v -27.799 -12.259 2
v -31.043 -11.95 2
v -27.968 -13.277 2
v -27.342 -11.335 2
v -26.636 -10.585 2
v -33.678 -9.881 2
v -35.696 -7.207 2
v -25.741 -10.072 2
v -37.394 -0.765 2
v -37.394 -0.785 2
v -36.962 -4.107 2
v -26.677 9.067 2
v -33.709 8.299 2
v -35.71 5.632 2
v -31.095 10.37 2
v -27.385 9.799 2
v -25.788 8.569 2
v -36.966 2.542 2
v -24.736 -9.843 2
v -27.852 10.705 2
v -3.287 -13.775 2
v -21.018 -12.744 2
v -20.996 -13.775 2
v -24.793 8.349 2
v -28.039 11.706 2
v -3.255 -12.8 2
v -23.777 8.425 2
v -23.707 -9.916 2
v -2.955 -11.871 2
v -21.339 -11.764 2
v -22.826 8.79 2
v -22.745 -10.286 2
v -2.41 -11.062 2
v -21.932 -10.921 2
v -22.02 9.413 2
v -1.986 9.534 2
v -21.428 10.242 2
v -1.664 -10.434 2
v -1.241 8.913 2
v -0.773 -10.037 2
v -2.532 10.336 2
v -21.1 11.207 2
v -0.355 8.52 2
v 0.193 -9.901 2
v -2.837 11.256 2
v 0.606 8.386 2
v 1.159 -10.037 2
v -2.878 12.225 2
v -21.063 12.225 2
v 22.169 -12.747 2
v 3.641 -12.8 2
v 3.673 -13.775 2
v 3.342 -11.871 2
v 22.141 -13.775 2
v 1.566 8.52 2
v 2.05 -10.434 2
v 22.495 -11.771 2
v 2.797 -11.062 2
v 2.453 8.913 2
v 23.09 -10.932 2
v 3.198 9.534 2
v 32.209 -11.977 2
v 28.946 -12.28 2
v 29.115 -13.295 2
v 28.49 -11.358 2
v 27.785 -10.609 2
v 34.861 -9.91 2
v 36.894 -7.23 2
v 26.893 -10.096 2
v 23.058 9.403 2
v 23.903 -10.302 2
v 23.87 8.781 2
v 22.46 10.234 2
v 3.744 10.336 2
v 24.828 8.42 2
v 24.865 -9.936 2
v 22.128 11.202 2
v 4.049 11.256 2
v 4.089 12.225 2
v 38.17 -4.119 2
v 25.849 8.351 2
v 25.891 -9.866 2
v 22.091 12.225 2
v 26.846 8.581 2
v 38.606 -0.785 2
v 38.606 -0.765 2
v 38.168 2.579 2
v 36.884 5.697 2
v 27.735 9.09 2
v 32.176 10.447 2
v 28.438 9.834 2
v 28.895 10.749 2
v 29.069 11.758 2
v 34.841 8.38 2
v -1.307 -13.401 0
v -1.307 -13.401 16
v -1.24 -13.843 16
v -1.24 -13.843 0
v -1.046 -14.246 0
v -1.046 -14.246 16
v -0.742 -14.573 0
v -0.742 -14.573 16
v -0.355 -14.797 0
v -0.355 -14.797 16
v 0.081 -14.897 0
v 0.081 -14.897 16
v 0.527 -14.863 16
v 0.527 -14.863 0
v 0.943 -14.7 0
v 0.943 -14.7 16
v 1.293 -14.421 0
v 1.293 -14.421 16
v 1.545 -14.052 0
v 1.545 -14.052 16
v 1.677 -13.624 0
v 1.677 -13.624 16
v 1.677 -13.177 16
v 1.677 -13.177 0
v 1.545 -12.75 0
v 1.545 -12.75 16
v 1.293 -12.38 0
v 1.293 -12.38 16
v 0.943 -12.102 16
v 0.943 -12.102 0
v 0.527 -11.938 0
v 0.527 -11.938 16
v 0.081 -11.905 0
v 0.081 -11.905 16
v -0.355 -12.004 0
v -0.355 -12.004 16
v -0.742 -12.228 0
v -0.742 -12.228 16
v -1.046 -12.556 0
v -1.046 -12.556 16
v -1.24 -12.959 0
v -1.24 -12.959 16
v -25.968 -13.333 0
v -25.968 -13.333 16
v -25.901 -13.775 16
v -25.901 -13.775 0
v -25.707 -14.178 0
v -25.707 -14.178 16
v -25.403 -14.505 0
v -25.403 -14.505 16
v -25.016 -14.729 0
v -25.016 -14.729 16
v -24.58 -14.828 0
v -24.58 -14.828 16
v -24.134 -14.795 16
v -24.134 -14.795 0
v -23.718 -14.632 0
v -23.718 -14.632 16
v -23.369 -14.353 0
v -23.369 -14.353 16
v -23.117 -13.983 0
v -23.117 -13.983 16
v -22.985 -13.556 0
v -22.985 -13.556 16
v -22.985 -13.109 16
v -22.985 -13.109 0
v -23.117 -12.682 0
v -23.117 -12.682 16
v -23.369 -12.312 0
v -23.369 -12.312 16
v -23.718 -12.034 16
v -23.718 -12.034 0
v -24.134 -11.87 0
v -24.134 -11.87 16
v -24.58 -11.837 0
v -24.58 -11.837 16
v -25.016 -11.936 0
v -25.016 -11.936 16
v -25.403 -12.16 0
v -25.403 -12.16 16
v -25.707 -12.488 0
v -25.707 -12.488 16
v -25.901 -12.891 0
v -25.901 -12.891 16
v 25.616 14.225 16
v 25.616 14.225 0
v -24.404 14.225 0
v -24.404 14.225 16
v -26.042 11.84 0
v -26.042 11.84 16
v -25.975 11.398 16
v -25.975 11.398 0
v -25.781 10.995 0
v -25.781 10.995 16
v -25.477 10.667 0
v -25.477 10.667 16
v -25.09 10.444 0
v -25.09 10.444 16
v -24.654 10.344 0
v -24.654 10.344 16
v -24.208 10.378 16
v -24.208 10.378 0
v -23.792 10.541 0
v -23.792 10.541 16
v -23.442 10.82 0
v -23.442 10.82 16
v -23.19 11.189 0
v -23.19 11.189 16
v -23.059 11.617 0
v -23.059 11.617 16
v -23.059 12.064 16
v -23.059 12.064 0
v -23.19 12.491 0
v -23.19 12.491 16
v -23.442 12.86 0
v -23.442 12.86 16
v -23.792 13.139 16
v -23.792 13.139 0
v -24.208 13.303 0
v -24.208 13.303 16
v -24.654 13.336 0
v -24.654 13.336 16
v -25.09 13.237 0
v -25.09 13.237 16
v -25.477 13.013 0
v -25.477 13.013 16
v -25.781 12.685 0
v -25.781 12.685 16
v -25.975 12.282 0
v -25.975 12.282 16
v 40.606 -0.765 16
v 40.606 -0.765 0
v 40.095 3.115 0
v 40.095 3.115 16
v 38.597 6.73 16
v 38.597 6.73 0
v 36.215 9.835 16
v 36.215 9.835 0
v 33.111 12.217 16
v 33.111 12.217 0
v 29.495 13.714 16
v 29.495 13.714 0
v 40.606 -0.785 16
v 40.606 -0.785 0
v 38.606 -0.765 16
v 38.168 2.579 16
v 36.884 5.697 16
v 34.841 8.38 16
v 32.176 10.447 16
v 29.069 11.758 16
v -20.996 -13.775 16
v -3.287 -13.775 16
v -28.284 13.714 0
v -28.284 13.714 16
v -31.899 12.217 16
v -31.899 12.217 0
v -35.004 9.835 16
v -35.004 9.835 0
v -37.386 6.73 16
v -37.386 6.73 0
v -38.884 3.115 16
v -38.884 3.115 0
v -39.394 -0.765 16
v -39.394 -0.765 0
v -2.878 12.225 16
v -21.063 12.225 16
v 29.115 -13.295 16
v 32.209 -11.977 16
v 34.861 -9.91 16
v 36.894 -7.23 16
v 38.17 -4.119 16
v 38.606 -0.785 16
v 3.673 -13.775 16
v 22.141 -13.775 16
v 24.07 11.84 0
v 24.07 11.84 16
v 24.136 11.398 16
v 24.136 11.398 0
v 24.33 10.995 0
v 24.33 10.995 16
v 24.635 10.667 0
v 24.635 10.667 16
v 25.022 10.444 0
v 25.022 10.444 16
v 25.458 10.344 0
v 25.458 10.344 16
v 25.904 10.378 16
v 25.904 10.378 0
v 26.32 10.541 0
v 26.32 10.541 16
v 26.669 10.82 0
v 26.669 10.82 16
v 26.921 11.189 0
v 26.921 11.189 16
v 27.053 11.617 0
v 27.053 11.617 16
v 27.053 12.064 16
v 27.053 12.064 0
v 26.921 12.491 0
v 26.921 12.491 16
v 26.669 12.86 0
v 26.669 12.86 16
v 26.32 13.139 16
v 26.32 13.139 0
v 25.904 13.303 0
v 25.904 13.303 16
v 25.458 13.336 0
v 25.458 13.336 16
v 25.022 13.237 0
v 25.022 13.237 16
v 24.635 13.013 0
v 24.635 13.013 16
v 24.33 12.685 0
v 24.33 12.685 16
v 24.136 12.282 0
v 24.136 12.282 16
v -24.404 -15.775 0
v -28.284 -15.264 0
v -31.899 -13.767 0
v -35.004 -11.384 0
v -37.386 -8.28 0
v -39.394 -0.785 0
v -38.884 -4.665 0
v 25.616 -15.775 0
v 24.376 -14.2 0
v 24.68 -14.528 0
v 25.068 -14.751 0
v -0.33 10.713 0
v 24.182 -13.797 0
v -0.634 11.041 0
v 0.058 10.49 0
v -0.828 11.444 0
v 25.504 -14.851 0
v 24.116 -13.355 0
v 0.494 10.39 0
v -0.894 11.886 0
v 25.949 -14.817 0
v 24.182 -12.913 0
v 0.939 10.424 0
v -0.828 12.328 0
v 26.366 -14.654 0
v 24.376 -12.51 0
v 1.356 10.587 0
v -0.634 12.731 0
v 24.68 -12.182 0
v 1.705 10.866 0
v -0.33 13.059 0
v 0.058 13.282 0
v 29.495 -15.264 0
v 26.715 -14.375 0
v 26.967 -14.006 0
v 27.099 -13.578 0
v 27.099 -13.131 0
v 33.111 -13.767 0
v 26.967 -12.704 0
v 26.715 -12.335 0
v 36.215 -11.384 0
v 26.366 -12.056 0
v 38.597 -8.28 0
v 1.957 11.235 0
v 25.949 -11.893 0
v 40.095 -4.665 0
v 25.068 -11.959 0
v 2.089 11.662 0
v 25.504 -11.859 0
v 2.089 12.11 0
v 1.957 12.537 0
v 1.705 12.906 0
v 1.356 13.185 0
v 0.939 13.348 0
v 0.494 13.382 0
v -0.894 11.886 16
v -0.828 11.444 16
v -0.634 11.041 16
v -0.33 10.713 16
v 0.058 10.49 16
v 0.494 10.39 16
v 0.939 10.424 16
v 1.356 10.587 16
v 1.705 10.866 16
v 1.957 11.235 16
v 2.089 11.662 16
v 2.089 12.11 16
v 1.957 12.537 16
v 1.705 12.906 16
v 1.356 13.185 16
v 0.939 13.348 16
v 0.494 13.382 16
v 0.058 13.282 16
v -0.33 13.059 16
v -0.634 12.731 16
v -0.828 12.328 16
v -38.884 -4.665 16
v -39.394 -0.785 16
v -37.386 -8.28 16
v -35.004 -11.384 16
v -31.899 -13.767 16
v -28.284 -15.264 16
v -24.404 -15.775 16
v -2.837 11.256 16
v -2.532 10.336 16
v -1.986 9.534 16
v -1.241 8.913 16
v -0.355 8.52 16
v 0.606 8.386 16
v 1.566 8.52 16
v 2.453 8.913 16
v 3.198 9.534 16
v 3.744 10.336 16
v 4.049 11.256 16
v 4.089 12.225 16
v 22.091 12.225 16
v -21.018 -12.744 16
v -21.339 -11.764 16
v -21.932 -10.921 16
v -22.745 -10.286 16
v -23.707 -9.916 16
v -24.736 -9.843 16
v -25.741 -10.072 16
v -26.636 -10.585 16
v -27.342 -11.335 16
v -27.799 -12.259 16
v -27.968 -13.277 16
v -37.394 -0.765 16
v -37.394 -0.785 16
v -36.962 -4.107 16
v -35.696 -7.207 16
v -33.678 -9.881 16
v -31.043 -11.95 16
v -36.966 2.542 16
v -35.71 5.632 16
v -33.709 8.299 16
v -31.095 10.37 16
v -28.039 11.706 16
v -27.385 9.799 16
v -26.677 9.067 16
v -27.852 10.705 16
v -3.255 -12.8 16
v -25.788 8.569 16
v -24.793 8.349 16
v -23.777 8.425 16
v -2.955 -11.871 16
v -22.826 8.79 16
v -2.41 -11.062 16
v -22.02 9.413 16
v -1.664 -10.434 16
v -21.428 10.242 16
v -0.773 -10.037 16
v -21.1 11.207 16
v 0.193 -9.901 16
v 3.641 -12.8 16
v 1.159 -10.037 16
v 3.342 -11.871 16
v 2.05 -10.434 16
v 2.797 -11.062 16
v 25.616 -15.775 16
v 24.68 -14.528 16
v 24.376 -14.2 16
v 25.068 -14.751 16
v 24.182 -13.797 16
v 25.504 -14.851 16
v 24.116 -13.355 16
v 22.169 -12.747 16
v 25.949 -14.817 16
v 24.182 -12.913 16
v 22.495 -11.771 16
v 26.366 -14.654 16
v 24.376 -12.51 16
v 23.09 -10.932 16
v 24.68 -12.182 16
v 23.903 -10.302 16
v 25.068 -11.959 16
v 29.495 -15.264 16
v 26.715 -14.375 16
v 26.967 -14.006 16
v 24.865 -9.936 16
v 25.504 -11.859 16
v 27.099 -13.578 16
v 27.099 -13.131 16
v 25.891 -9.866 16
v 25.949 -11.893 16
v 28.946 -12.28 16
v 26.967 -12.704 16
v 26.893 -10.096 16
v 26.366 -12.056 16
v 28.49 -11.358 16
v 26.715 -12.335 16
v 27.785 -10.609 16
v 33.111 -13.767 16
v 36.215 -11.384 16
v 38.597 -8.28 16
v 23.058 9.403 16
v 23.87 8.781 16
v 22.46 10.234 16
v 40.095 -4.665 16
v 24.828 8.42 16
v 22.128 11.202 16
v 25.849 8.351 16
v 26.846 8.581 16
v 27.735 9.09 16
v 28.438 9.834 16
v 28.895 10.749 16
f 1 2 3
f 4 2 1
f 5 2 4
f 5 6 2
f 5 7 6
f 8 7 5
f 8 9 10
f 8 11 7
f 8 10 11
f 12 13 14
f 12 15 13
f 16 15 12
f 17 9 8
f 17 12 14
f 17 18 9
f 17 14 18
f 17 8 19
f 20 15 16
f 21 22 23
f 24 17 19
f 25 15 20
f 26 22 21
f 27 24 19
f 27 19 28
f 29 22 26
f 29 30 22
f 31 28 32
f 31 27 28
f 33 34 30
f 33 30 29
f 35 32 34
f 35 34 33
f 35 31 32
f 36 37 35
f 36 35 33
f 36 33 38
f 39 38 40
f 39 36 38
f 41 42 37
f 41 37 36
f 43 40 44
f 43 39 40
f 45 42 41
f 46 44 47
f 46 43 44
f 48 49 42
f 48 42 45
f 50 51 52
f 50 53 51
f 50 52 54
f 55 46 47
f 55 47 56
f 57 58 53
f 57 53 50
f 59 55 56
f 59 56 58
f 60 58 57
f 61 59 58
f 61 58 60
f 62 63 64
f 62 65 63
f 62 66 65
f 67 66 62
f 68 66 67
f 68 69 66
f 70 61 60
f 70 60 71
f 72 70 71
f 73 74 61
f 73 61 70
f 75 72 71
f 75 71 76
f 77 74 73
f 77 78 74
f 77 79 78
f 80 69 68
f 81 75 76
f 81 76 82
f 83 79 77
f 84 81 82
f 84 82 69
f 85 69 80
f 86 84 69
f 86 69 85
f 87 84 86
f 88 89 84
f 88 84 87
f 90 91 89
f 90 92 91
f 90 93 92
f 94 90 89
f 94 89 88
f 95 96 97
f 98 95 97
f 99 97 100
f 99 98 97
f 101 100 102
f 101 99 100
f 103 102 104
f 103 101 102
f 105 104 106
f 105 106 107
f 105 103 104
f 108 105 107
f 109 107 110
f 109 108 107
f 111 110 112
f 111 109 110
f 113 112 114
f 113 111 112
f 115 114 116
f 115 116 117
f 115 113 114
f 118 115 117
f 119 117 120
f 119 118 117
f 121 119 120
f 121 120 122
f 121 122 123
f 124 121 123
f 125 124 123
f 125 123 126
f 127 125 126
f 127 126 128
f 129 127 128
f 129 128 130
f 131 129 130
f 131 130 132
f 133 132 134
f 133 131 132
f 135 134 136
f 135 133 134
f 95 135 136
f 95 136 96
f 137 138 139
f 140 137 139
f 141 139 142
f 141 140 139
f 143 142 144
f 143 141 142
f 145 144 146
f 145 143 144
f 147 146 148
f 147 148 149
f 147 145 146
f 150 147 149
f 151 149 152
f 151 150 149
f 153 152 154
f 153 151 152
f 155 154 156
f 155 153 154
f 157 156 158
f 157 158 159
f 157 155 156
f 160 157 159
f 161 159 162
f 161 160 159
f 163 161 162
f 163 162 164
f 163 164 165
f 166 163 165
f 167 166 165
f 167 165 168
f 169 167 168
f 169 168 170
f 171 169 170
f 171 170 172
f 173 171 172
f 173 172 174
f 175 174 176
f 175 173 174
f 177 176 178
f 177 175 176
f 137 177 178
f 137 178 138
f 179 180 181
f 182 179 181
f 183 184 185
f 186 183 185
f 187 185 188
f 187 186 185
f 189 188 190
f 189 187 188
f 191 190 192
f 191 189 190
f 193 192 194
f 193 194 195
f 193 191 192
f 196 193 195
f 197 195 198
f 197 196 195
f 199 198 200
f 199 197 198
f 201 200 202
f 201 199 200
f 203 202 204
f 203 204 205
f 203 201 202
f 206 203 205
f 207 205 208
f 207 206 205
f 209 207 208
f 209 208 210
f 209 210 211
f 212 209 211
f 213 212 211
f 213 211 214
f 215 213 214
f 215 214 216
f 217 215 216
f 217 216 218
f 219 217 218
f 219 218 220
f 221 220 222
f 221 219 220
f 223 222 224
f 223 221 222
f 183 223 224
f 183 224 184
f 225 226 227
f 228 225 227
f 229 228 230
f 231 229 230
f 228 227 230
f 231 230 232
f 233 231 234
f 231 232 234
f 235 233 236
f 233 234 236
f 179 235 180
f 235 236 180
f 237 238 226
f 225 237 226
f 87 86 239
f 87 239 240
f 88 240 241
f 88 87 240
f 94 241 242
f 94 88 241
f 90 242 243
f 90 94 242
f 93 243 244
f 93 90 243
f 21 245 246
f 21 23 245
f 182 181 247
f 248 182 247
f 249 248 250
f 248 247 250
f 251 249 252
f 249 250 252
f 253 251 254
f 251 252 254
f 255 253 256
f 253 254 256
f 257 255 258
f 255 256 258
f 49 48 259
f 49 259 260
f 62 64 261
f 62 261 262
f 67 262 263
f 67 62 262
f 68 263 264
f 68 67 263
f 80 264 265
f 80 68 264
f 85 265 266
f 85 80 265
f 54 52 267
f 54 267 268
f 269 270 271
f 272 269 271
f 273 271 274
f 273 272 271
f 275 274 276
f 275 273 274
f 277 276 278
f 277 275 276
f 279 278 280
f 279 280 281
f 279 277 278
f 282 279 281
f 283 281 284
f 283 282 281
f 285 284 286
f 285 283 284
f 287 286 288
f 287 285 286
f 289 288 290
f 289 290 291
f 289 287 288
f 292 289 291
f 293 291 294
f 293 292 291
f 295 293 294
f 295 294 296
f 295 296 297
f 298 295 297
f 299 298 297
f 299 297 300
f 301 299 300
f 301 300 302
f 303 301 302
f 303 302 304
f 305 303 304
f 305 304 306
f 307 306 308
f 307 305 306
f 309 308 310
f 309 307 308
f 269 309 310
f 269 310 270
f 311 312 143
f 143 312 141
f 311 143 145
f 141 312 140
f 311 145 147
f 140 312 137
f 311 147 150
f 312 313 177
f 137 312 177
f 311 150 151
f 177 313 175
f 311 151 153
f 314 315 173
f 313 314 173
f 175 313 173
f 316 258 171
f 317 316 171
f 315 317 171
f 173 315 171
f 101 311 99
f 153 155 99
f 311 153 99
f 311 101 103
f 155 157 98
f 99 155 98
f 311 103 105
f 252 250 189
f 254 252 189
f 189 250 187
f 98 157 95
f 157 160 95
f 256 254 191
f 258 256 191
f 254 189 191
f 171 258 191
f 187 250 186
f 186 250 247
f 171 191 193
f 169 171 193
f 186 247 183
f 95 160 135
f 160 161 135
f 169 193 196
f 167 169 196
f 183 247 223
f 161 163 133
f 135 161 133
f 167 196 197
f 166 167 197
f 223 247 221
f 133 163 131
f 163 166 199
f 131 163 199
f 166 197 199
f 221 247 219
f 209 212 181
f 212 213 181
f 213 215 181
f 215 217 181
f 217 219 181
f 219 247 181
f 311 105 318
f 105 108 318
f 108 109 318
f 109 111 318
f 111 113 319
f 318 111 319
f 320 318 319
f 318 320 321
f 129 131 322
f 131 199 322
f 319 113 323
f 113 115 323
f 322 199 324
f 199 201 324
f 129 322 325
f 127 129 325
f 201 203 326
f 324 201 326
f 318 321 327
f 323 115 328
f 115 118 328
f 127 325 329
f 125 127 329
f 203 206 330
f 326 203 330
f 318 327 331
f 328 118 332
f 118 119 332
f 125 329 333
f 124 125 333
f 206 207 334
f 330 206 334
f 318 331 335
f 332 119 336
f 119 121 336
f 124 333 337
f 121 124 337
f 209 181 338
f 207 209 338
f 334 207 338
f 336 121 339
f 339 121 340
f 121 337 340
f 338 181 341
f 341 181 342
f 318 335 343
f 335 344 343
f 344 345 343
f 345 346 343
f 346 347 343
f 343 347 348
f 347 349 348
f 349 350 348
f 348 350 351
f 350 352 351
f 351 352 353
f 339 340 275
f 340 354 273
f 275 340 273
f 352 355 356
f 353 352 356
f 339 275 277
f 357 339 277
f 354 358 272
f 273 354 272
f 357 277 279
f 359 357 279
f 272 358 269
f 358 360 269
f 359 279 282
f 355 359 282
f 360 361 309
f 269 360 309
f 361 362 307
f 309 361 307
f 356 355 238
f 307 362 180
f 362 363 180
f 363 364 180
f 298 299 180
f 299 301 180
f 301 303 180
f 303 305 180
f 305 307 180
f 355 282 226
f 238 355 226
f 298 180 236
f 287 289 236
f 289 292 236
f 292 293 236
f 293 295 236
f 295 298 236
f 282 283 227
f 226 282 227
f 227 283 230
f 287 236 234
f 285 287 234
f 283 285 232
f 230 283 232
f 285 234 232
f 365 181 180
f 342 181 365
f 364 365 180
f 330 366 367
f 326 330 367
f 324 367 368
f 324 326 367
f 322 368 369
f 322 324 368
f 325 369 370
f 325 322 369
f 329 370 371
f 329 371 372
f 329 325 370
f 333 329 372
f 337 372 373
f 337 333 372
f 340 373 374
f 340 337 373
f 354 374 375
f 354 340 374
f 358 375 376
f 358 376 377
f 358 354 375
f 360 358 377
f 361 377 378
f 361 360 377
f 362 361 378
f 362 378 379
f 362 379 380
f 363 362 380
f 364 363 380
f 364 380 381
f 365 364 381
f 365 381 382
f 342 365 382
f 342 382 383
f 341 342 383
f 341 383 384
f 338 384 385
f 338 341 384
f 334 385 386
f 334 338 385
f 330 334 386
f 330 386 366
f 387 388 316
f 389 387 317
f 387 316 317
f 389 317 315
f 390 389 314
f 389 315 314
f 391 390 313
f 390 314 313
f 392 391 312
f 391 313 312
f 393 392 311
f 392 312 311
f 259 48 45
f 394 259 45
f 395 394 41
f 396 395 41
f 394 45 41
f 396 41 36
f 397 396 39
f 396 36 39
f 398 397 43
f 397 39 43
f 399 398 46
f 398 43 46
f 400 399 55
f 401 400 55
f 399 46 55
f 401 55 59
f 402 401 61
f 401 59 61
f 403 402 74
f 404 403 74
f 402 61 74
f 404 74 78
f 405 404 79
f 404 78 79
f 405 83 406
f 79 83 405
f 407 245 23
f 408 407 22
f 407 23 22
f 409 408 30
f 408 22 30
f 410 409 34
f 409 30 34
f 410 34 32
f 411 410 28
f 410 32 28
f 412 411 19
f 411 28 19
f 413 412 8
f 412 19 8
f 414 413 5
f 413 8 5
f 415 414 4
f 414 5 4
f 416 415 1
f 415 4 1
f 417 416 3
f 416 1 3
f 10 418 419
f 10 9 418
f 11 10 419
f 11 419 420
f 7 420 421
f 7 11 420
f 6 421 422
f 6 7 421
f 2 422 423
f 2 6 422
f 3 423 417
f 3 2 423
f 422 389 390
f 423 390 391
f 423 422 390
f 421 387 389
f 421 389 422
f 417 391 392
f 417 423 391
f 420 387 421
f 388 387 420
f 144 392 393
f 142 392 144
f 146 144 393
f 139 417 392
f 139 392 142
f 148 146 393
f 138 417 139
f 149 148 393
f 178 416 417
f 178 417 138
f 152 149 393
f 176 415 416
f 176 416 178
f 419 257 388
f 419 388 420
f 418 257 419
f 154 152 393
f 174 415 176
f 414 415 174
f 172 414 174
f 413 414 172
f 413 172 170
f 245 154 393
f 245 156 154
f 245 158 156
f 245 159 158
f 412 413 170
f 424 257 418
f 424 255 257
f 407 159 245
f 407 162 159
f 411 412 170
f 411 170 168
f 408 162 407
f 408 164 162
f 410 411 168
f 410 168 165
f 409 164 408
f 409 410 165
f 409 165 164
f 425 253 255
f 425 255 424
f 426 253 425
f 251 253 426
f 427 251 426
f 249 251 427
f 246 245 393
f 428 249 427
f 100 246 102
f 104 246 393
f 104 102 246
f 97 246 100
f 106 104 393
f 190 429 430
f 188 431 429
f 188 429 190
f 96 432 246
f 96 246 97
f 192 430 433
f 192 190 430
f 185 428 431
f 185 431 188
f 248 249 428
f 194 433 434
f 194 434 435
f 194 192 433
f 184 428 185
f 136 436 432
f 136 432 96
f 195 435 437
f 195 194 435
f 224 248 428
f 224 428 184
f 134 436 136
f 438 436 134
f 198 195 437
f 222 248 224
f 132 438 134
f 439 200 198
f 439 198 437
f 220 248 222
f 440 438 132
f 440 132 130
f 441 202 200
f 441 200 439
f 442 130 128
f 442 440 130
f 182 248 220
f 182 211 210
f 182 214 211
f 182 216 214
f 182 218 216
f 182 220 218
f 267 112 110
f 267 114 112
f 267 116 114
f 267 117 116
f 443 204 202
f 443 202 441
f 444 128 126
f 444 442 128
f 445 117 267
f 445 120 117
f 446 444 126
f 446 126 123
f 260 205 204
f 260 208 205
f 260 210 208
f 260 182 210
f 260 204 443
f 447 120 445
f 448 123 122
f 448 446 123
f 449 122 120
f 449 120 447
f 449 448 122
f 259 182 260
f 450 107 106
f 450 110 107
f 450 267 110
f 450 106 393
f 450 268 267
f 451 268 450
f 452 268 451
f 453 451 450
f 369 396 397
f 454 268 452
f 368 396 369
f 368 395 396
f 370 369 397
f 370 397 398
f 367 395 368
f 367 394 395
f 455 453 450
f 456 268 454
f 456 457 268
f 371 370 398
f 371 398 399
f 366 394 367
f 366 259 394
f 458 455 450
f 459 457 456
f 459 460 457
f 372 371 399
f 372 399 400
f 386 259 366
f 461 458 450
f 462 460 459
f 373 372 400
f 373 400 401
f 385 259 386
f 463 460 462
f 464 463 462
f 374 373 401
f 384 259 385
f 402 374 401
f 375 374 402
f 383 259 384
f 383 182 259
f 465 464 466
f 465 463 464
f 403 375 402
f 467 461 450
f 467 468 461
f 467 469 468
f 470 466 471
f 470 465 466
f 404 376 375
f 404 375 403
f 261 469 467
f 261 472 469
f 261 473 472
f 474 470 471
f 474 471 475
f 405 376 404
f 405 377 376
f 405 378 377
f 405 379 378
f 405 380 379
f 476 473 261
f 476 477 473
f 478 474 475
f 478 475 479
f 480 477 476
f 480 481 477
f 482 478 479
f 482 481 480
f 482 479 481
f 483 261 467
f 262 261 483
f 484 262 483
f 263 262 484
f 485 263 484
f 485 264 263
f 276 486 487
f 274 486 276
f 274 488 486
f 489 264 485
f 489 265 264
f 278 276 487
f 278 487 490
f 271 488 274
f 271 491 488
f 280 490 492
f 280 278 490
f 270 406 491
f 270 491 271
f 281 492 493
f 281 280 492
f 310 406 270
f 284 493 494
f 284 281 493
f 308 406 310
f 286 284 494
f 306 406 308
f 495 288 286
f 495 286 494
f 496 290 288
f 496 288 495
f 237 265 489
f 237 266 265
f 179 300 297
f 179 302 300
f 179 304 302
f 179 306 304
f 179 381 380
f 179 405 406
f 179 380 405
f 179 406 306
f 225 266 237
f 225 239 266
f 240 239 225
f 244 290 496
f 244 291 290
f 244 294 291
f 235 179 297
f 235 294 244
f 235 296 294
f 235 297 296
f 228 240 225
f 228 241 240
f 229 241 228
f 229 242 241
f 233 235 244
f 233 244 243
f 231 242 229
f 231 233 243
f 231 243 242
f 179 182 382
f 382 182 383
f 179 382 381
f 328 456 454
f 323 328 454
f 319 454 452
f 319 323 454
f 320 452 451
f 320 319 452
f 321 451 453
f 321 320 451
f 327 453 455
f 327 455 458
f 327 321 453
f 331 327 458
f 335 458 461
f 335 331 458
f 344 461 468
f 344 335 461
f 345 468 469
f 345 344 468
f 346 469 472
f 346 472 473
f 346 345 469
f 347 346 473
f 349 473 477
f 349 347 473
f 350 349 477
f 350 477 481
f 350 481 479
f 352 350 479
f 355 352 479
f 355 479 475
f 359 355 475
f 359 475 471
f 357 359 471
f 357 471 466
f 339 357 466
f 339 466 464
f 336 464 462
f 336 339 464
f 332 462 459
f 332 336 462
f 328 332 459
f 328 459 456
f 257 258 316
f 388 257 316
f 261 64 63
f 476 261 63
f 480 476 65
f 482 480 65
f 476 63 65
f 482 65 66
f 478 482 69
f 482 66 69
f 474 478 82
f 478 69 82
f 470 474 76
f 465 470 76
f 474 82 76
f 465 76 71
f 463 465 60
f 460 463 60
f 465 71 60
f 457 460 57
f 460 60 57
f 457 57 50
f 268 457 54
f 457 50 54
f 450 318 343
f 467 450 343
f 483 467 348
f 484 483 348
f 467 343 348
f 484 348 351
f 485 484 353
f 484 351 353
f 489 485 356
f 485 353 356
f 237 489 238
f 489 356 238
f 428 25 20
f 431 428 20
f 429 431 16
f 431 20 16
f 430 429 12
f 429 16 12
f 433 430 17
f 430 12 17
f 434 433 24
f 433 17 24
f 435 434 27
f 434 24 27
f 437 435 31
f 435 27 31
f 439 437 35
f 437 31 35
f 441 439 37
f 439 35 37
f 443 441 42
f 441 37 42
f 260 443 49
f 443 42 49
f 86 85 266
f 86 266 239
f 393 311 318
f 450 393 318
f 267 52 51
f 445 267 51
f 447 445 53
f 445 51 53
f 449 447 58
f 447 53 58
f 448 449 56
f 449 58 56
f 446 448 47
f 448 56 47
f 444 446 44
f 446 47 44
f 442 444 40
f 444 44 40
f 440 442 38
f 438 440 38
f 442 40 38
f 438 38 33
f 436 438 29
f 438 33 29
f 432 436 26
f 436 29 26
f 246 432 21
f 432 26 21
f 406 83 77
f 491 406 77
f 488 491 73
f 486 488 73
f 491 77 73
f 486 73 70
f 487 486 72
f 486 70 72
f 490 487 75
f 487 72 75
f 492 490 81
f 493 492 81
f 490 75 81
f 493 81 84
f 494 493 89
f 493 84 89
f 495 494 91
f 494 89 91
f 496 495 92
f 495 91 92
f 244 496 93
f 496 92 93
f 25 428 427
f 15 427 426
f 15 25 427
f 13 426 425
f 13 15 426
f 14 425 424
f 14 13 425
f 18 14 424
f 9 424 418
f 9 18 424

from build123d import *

# Parameters (mm, degrees)
SKETCH3_R           = 1.5
BOSS_EXTRUDE2_DEPTH = 16
SHELL4_T            = -2


with BuildPart() as part:
    # Sketch3 → Boss-Extrude2 (new body)
    with BuildSketch(Plane.XY):
        with BuildLine():
            Line((40.605667182, -0.784898421), (40.605667182, -0.764898421))
            ThreePointArc((40.605667182, -0.764898421), (36.215197832, 9.834632229), (25.615667182, 14.225101579))
            Line((25.615667182, 14.225101579), (-24.404332818, 14.225101579))
            ThreePointArc((-24.404332818, 14.225101579), (-35.003863468, 9.834632229), (-39.394332818, -0.764898421))
            Line((-39.394332818, -0.764898421), (-39.394332818, -0.784898421))
            ThreePointArc((-39.394332818, -0.784898421), (-35.003863468, -11.384429071), (-24.404332818, -15.774898421))
            Line((-24.404332818, -15.774898421), (25.615667182, -15.774898421))
            ThreePointArc((25.615667182, -15.774898421), (36.215197832, -11.384429071), (40.605667182, -0.784898421))
        make_face()
        with Locations(Location((25.569857848, 11.840225967, 0), (0, 0, 180))):
            Circle(SKETCH3_R, mode=Mode.SUBTRACT)
        with Locations(Location((25.615667182, -13.354907477, 0), (0, 0, 180))):
            Circle(SKETCH3_R, mode=Mode.SUBTRACT)
        with Locations(Location((0.19338318, -13.400716811, 0), (0, 0, 180))):
            Circle(SKETCH3_R, mode=Mode.SUBTRACT)
        with Locations(Location((0.605667182, 11.8860353, 0), (0, 0, 180))):
            Circle(SKETCH3_R, mode=Mode.SUBTRACT)
        with Locations(Location((-24.541760819, 11.840225967, 0), (0, 0, 180))):
            Circle(SKETCH3_R, mode=Mode.SUBTRACT)
        with Locations(Location((-24.468118501, -13.332659391, 0), (0, 0, 180))):
            Circle(SKETCH3_R, mode=Mode.SUBTRACT)
    extrude(amount=BOSS_EXTRUDE2_DEPTH)

    # Shell4
    shell4_openings = [part.faces().sort_by_distance(p)[0] for p in [
        (0.60782007, -0.775315064, 16),
    ]]
    offset(amount=SHELL4_T, openings=shell4_openings)


solid = part.part
